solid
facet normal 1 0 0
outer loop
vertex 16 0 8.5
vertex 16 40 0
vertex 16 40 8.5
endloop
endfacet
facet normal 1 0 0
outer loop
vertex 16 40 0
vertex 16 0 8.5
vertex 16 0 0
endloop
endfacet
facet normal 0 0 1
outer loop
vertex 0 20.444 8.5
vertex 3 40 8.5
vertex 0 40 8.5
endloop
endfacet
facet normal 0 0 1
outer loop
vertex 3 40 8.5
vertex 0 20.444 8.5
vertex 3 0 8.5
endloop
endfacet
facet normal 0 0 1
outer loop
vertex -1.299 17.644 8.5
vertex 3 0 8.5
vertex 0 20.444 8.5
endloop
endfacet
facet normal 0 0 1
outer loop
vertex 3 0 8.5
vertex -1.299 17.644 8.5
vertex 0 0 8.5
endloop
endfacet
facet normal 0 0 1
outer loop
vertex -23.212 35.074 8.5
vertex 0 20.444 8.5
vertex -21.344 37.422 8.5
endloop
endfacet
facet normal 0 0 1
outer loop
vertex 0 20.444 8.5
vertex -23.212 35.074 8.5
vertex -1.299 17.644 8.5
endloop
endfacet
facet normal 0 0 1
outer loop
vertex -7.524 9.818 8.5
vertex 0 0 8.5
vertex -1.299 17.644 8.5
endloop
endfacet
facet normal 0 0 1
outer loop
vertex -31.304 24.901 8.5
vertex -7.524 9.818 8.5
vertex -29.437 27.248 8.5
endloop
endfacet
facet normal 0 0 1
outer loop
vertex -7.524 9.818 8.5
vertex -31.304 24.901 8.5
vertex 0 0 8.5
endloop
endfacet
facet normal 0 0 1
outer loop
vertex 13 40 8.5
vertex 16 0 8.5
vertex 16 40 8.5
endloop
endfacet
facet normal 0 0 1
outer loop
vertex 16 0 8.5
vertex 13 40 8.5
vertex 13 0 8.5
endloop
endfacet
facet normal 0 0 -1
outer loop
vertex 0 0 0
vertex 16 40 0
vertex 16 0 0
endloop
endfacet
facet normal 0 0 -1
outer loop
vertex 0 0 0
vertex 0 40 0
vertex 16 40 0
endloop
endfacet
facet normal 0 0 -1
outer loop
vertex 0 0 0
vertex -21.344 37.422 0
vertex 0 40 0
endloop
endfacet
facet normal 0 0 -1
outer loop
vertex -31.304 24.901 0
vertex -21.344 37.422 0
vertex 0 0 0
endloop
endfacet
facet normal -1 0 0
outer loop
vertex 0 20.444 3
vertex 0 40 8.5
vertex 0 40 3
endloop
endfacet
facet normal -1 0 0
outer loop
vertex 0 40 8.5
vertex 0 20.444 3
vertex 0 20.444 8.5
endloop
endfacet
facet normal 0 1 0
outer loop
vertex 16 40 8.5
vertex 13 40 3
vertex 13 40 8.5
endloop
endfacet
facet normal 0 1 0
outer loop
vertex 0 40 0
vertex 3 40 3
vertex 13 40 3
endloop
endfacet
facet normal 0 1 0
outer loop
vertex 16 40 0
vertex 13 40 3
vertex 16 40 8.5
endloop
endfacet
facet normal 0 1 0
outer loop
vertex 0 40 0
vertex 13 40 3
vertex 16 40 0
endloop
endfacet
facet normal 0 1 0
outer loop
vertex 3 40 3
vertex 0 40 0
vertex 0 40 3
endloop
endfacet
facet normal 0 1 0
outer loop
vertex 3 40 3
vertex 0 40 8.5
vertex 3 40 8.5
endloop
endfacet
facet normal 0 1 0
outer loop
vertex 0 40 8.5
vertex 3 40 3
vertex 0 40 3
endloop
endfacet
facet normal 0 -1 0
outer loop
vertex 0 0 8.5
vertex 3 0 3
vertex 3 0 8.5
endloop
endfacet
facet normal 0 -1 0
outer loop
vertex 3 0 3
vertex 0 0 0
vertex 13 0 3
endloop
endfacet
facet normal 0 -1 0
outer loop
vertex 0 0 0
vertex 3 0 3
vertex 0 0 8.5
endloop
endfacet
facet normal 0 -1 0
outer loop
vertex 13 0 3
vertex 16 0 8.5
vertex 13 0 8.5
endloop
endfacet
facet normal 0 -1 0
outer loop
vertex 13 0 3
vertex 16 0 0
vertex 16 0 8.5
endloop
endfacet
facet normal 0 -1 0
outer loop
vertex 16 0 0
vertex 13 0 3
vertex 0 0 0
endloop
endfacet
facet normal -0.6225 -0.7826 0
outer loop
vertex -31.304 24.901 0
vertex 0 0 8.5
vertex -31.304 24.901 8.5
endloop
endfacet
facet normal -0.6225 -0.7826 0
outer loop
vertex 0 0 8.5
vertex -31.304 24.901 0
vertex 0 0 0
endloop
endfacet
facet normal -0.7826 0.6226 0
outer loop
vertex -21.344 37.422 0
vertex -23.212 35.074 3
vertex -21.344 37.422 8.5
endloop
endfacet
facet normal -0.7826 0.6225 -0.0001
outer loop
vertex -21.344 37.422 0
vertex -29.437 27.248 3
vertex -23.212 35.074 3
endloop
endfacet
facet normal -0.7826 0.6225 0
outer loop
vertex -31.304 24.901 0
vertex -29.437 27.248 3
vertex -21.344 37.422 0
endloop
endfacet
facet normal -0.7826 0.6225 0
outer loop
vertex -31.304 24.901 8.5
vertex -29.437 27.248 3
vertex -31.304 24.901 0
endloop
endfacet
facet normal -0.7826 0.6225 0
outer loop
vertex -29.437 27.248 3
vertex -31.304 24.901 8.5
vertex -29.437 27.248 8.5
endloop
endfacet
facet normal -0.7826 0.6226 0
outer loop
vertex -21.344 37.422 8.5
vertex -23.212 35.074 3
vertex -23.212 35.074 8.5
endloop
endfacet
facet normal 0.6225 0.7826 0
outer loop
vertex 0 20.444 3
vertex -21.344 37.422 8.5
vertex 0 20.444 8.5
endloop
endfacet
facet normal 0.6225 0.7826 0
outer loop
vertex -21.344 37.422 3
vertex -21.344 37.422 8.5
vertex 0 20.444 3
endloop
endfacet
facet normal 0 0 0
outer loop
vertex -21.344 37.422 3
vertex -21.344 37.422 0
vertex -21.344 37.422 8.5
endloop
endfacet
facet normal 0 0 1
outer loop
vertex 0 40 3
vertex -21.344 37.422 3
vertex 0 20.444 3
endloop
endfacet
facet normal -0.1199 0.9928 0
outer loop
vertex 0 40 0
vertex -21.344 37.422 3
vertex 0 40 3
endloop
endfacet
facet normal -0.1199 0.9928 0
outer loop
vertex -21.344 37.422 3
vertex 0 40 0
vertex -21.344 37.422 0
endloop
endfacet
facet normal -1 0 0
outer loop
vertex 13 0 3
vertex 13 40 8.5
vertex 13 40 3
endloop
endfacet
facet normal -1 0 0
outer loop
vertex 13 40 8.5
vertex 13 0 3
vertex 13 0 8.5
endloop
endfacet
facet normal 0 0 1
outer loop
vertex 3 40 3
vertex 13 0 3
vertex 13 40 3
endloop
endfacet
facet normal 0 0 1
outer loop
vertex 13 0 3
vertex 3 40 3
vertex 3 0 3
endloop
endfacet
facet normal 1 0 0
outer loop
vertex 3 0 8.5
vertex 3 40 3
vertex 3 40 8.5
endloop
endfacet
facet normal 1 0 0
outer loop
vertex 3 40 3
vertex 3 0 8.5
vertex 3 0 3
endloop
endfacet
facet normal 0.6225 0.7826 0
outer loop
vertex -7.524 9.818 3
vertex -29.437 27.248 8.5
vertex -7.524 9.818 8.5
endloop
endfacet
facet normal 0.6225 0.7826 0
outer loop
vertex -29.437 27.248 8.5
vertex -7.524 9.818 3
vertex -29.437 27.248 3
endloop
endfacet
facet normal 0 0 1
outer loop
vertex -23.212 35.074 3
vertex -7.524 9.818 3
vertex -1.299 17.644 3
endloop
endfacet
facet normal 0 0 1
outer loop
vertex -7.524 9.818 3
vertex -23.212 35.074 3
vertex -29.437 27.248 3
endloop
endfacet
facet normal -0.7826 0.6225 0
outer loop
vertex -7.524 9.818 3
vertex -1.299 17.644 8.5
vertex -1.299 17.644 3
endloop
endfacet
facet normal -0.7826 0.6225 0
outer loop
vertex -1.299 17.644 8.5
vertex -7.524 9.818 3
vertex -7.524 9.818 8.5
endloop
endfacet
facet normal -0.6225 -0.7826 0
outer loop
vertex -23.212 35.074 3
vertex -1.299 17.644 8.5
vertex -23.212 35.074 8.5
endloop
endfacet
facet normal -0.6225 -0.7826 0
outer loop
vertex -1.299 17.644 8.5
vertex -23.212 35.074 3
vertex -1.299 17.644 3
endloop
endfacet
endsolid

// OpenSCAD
ml = 40;
thick = 3;
d = 10;
a = 38.5;

difference() {
    union() {
        cube([d + 2 * thick, ml, thick + d / 2 + 0.5]);
        rotate([0, 0, 90 - a]) cube([d + 2 * thick, ml, thick + d / 2 + 0.5]);
        linear_extrude(height = thick)
            polygon(points = [
                [0, ml], [0, ml / 2],
                [-cos(a) * ml + sin(a) * (d + 2 * thick), sin(a) * ml + cos(a) * (d + 2 * thick)]],
        paths = [[0, 1, 2]]);
    }
    translate([thick, -0.1, thick]) cube([d, ml + 0.2, d / 2 + 0.5 + 0.1]);
    rotate([0, 0, 90 - a])
        translate([thick, 12, thick]) cube([d, ml + 0.2, d / 2 + 0.5 + 0.1]);
}
